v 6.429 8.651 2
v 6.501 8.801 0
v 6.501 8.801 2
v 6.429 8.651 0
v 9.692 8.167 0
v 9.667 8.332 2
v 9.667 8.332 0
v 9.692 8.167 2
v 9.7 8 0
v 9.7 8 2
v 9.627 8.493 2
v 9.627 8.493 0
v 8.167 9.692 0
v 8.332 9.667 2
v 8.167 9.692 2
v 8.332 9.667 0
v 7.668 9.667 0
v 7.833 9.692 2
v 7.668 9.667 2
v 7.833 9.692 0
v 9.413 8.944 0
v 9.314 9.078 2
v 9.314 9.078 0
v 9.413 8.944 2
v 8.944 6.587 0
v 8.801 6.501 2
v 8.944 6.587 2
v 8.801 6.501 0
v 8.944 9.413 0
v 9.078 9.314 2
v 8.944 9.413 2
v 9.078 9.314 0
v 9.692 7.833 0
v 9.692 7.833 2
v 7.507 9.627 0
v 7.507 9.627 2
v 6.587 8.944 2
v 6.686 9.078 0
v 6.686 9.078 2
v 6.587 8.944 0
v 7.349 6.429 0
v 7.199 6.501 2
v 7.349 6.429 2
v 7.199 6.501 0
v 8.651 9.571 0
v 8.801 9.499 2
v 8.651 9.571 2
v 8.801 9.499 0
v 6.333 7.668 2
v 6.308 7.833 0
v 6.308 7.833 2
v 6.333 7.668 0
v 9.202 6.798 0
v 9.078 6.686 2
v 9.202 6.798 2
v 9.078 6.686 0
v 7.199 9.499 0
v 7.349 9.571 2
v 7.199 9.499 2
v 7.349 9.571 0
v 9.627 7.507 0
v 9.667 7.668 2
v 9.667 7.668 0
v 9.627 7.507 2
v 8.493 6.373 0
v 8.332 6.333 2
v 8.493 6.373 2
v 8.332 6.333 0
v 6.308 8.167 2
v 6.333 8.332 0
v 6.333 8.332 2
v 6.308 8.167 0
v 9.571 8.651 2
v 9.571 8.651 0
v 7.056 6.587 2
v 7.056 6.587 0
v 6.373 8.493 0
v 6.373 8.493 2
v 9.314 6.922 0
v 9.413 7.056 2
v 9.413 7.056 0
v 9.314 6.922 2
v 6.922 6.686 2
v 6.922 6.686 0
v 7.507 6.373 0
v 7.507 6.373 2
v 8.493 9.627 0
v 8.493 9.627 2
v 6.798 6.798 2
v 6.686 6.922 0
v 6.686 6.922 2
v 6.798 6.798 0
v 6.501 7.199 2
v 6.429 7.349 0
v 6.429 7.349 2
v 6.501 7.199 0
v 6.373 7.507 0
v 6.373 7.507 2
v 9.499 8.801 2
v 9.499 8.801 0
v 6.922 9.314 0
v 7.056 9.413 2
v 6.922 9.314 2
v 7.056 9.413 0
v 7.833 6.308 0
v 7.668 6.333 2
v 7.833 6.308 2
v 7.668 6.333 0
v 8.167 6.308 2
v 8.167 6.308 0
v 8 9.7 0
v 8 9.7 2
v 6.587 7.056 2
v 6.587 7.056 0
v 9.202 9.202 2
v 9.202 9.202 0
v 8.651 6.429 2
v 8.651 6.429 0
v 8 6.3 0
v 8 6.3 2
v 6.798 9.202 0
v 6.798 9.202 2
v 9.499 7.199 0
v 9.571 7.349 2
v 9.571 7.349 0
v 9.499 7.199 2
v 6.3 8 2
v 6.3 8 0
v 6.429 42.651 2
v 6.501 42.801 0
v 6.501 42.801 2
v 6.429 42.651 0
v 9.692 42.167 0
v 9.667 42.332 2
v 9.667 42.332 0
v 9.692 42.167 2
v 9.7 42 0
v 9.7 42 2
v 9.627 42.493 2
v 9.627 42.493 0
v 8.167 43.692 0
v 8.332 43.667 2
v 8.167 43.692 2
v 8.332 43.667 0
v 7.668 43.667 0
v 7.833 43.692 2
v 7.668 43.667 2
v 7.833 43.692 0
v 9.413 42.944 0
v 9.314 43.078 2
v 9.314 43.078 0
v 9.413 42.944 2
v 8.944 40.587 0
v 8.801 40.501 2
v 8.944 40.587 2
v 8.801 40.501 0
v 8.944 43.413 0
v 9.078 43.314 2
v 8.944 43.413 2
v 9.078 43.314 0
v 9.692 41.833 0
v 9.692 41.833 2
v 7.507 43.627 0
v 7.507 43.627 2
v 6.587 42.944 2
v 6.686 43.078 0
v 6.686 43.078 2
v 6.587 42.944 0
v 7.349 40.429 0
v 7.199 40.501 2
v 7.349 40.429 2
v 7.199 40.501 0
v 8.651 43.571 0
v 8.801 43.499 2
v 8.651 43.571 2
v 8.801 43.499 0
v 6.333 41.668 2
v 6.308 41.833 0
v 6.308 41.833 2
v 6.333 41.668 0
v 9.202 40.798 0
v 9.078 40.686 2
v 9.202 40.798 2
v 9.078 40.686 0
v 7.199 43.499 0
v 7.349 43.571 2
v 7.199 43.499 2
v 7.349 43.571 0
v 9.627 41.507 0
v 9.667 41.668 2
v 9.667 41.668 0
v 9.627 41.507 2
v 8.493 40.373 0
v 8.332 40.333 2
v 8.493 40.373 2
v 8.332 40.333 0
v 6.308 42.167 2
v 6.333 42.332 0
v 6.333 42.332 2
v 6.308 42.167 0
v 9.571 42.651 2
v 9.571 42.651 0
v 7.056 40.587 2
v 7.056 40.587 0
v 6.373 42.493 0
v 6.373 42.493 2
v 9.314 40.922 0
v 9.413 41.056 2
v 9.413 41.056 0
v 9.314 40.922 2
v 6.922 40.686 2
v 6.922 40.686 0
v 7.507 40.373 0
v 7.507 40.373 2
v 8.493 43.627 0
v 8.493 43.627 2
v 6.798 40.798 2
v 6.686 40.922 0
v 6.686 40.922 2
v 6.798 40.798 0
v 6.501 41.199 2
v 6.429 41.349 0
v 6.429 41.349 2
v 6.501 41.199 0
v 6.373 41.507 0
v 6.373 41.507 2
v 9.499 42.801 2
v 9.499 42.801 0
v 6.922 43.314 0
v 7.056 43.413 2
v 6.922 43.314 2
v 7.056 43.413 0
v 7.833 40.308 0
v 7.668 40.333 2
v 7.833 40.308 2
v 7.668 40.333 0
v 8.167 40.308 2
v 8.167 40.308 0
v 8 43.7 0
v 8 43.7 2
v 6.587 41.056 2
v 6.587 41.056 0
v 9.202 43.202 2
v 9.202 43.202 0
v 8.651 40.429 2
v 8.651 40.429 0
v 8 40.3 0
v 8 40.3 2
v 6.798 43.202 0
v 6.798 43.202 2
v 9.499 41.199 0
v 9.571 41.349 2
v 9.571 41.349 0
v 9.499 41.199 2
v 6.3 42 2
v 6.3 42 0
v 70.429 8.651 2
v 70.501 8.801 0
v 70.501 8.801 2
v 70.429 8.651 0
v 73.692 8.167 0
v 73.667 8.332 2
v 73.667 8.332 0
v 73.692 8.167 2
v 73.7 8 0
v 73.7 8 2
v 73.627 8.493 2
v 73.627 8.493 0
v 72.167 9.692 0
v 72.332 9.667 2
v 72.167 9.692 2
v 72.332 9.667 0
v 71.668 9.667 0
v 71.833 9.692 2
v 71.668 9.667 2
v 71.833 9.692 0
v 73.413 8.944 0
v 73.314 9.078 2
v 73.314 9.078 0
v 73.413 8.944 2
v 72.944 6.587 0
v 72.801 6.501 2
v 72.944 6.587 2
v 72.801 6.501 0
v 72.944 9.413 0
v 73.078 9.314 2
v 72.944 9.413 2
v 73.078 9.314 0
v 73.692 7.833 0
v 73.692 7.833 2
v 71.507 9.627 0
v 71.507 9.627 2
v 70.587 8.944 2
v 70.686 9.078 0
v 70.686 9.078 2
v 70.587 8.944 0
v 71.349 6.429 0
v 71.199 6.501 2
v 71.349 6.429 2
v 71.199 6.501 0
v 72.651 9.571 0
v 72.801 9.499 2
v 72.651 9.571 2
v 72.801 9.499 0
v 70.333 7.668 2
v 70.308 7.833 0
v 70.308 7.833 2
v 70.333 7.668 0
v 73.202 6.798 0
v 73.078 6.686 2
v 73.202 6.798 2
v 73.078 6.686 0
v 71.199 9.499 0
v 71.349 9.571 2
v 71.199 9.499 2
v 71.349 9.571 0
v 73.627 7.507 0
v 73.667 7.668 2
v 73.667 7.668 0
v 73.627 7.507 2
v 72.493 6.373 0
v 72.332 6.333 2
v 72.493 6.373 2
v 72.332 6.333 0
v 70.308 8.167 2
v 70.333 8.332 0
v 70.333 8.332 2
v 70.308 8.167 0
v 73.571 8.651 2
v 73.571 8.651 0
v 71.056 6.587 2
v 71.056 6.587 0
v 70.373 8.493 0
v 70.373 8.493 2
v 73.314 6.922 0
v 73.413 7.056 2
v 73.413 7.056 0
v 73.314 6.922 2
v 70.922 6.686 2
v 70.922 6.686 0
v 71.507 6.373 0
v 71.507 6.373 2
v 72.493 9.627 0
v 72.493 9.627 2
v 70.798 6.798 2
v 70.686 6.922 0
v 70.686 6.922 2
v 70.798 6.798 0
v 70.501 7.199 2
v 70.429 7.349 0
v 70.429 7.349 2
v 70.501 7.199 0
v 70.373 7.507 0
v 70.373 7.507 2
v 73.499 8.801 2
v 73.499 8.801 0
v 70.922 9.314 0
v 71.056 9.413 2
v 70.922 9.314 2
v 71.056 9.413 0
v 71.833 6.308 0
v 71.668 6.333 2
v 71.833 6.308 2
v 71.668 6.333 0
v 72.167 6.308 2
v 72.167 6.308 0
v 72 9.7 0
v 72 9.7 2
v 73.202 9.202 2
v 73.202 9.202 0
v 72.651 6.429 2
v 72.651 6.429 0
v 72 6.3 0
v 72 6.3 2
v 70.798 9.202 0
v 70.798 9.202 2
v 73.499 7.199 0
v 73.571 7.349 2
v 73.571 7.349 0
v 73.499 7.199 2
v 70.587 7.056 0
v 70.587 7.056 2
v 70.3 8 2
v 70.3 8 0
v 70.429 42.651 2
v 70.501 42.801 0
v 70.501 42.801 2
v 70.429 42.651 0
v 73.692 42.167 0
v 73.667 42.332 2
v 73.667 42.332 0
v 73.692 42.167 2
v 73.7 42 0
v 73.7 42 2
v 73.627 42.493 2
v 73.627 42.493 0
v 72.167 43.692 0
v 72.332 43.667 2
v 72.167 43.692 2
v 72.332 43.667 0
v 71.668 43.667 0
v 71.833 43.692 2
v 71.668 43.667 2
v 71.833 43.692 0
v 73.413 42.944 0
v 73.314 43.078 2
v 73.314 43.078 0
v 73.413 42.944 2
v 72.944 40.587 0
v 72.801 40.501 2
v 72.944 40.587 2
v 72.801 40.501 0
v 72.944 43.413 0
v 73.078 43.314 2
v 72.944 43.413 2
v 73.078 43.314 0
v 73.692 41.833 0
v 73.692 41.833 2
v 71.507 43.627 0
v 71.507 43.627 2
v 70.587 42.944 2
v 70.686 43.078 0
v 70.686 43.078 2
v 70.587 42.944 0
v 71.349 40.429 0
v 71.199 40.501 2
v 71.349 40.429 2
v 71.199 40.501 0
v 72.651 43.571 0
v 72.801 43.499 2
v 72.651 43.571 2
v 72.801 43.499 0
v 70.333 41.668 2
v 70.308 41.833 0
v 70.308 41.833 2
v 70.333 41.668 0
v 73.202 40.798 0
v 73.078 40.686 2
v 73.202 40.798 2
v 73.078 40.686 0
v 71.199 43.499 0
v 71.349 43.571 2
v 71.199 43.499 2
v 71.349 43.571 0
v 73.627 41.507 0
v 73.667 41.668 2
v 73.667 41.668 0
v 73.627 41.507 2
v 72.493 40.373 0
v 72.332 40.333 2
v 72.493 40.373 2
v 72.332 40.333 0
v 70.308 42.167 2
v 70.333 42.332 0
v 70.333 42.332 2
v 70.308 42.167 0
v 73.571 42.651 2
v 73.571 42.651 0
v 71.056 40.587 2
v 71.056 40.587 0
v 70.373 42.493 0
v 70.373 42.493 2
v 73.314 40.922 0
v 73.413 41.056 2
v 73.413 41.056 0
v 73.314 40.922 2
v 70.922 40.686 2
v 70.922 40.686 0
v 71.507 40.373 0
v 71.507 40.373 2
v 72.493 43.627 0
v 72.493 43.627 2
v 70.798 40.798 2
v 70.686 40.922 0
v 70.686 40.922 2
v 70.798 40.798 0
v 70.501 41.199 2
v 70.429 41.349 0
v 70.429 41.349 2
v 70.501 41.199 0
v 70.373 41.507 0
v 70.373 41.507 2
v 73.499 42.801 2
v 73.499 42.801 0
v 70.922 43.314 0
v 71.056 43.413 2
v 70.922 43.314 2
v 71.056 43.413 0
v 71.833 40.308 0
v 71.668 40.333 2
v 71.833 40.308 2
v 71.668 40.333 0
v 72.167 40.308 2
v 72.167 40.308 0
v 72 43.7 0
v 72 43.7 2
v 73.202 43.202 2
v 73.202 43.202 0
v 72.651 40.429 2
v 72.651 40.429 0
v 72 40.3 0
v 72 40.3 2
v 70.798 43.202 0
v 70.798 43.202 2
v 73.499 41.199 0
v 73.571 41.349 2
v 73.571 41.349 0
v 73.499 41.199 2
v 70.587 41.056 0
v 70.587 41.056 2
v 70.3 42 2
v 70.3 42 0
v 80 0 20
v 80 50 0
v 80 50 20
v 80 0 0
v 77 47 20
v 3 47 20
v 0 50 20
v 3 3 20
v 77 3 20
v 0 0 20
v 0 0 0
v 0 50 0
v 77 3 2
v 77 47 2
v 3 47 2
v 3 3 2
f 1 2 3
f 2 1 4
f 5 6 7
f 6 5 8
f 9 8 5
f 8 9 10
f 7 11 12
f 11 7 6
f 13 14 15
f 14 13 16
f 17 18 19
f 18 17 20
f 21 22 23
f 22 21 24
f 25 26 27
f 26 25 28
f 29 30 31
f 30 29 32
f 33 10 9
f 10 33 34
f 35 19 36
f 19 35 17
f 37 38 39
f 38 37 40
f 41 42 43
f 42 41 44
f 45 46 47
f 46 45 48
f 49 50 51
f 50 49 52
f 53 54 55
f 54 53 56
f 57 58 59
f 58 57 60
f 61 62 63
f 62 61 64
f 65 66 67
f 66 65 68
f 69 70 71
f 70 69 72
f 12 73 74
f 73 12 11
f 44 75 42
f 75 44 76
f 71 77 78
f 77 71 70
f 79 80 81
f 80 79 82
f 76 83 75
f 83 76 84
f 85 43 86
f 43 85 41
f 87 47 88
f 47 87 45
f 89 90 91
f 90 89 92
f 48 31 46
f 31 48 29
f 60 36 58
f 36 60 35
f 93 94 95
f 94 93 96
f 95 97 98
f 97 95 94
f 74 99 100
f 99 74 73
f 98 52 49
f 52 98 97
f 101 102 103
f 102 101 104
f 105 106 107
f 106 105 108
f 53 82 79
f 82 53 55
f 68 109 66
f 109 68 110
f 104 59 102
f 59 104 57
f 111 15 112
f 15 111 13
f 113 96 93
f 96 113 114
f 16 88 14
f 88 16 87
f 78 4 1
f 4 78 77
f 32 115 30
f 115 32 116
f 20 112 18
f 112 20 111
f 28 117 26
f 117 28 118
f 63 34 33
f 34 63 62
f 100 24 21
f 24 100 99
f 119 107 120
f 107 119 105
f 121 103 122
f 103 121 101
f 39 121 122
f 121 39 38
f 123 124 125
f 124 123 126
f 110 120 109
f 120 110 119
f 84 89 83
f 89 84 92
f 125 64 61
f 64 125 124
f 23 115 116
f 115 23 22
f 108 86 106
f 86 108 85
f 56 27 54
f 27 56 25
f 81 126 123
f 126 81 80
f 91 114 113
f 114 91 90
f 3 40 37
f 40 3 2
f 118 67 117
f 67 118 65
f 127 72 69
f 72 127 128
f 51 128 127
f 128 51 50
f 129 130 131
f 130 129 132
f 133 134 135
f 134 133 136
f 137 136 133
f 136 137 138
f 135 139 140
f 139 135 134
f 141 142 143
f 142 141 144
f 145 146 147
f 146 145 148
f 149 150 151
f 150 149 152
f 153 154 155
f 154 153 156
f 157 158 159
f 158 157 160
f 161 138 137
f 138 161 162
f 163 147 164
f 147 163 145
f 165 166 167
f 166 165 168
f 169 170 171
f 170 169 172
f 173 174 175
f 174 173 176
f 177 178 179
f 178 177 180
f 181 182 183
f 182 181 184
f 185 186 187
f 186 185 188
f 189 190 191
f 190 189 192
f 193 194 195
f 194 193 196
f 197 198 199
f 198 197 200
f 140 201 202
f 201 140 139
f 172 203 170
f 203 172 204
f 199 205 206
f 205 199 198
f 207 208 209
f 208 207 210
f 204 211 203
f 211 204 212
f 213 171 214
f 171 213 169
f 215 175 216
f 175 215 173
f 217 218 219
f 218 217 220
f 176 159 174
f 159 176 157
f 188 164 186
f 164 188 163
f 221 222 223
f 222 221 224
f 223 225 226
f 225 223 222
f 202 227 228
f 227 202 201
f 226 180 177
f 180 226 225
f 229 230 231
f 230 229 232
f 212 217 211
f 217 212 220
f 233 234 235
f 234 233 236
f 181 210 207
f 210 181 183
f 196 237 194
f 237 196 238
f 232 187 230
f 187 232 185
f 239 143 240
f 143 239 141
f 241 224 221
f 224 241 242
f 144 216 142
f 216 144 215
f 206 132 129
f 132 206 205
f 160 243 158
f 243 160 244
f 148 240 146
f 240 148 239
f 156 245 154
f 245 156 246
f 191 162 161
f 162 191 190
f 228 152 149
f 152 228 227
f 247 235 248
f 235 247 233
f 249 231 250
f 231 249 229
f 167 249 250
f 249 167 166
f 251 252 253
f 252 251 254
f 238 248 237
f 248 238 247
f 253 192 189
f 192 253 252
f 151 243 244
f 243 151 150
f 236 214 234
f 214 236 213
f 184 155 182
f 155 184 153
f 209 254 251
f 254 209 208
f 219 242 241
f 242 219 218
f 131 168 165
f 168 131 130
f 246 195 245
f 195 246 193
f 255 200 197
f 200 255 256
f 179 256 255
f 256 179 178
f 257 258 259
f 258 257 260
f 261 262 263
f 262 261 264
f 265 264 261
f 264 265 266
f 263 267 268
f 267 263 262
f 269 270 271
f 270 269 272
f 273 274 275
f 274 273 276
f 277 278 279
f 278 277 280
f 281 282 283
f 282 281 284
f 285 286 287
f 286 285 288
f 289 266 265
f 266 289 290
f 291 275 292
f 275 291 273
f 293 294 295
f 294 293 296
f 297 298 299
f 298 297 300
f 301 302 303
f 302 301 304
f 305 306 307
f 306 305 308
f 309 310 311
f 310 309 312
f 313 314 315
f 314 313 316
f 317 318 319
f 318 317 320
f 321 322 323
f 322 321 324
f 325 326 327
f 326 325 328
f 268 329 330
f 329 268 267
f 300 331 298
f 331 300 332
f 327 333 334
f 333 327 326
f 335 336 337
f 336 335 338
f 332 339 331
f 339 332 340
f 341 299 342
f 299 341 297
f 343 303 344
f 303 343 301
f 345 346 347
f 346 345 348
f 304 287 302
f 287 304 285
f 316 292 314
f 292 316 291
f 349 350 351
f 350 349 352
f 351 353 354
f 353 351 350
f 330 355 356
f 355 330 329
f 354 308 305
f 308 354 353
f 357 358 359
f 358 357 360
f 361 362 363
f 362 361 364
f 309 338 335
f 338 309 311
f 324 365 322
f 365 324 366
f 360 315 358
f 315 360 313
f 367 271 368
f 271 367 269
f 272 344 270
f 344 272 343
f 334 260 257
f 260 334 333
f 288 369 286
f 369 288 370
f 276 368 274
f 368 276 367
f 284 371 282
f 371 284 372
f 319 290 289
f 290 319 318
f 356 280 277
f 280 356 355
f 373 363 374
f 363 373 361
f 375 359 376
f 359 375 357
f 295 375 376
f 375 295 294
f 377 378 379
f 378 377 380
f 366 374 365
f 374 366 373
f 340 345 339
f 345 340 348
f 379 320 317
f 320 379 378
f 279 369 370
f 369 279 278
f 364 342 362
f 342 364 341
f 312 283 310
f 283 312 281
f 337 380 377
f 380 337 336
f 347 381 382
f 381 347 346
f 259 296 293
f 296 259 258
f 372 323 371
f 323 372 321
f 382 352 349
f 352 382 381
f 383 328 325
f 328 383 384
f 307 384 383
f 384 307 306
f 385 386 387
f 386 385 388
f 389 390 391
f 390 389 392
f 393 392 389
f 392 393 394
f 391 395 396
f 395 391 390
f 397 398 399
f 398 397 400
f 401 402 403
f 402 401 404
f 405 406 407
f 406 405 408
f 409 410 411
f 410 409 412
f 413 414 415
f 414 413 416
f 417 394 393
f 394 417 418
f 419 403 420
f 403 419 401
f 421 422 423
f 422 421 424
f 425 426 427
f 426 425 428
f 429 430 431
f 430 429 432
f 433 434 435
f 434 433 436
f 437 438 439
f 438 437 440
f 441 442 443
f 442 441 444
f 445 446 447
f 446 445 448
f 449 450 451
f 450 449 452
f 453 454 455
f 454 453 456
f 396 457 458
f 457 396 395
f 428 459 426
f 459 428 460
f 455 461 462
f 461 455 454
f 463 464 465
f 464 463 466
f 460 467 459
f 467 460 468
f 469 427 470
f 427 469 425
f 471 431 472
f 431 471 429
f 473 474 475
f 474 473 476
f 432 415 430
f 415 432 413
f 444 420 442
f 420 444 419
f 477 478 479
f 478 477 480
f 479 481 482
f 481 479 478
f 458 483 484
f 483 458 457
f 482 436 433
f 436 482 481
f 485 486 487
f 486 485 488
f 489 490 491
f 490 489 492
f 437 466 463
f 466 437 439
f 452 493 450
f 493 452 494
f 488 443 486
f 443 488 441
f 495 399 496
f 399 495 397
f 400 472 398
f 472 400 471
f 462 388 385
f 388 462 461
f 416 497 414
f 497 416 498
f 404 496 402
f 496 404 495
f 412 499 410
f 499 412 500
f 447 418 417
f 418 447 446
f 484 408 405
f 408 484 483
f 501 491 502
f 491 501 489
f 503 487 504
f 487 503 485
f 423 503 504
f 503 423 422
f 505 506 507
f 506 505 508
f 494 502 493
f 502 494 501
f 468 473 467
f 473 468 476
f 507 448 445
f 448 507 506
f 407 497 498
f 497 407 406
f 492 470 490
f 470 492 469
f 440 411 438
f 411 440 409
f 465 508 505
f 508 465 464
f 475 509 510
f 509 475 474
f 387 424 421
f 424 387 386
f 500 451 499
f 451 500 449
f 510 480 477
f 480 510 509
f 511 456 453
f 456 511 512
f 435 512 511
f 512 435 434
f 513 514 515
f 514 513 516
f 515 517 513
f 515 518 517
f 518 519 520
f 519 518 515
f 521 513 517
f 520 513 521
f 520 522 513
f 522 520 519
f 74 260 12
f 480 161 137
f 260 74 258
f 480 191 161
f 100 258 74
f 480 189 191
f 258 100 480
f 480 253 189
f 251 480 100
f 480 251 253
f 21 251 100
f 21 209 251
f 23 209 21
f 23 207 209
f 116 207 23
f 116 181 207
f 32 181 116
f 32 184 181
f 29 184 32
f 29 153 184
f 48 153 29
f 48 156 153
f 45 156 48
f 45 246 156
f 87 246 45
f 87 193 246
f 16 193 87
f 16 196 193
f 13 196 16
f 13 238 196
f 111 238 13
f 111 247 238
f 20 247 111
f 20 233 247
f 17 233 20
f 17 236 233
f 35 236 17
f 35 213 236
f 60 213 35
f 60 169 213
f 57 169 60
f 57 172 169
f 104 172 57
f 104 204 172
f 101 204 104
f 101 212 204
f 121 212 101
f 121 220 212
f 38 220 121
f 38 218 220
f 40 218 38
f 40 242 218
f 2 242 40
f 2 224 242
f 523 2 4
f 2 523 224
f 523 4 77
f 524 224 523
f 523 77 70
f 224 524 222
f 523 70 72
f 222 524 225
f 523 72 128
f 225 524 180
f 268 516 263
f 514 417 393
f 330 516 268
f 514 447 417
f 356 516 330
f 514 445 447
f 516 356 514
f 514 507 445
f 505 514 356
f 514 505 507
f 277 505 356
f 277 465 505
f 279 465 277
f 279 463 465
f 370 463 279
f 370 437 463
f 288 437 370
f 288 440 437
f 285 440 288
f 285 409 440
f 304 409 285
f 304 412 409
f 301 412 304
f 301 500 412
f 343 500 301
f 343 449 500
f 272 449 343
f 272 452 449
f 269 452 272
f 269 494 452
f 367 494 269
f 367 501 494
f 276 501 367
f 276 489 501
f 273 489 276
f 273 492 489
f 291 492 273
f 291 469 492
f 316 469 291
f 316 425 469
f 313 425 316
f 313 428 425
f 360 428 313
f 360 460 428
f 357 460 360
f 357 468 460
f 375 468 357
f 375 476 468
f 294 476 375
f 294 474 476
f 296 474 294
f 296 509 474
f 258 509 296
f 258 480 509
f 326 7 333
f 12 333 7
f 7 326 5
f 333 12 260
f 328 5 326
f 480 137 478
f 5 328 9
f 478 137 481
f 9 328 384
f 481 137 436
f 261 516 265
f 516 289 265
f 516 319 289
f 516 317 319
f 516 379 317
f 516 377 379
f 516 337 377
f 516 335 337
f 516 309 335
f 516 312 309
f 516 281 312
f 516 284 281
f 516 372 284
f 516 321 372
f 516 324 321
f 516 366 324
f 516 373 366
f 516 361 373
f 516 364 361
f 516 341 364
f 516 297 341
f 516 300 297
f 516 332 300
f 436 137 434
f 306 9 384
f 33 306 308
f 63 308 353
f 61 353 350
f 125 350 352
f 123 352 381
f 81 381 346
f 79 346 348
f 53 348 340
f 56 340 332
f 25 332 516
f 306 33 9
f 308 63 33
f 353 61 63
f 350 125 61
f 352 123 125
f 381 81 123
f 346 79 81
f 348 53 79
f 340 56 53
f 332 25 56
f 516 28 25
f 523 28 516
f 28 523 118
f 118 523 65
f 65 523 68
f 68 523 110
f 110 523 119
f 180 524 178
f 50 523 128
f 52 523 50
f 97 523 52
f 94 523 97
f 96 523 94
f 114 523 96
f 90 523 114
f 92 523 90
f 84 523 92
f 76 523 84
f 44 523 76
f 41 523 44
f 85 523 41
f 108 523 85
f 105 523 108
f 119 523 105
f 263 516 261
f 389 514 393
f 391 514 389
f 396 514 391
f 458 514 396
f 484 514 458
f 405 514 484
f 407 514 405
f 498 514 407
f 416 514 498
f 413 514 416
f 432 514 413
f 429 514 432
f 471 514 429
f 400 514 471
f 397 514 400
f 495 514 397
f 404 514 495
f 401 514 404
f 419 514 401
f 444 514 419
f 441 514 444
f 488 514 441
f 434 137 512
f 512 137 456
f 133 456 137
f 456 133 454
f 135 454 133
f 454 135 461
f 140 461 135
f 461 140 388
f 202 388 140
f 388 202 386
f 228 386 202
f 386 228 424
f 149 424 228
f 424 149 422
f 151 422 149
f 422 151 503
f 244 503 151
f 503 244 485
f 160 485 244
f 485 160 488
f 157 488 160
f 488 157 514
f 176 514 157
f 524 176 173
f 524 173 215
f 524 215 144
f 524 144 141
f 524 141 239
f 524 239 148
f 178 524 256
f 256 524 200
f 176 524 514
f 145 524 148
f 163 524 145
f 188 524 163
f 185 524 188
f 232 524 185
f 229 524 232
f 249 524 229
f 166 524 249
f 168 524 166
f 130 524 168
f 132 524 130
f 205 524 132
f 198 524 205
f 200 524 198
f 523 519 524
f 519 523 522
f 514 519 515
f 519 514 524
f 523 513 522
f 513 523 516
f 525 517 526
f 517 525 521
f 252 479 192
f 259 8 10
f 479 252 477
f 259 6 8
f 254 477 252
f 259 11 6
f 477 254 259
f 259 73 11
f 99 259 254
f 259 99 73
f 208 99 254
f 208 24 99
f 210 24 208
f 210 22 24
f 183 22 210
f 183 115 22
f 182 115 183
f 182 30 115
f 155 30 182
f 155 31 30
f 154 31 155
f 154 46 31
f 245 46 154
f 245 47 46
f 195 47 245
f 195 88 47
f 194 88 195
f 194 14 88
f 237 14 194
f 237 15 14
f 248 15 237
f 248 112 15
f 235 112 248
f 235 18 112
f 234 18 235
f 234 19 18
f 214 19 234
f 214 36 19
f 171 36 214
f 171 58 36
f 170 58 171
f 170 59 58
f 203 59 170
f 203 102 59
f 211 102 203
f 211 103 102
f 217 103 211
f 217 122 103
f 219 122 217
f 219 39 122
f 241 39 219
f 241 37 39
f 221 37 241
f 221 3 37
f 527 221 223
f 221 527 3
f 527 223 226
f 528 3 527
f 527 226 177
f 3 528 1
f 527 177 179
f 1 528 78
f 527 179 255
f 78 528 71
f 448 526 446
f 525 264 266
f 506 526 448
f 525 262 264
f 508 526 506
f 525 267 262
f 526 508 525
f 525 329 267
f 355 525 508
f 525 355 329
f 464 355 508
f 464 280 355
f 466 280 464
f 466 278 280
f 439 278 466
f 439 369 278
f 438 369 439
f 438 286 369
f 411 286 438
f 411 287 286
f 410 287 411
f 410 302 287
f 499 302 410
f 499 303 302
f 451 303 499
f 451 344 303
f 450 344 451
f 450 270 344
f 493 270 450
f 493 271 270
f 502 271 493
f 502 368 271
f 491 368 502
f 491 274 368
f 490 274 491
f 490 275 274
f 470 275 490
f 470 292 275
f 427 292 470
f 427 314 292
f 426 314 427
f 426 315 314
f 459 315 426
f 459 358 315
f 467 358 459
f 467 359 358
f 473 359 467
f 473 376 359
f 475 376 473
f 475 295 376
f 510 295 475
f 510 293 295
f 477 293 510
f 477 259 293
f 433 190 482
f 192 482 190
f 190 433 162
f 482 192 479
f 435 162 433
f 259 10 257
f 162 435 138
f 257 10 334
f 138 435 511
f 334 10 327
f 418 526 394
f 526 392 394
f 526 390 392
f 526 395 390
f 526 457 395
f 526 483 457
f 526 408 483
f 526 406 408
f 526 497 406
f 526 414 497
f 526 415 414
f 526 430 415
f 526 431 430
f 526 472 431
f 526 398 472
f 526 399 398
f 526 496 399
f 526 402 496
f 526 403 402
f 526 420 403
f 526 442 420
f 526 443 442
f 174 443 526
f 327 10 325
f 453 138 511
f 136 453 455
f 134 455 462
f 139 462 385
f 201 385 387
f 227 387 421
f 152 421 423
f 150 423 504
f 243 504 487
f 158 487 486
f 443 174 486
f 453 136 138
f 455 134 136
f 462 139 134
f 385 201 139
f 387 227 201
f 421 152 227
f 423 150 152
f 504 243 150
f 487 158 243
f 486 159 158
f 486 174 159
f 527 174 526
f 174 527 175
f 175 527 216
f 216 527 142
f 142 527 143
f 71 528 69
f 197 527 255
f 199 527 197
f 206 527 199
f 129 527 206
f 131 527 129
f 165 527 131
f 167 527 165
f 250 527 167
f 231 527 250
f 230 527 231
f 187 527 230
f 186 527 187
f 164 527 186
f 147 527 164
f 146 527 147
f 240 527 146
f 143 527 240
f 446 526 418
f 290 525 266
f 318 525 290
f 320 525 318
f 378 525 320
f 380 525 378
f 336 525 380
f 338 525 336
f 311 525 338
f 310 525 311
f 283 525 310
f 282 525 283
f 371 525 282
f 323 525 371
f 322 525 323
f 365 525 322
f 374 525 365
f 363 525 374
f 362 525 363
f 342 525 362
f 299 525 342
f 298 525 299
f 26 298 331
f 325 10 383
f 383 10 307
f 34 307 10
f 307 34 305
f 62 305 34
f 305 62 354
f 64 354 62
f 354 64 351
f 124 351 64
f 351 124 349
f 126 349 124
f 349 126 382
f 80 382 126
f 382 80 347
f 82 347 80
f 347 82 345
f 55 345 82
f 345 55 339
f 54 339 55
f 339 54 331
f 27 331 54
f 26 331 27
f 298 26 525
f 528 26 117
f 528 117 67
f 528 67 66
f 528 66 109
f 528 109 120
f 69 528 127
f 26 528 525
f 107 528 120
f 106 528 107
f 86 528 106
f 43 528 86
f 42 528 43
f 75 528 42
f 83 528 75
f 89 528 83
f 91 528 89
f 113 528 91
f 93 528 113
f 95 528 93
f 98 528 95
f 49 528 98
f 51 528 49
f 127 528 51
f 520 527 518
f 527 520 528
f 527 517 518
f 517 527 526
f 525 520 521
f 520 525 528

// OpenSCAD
// Smoke-test tray for the Grok Build ↔ Grok Bot OpenSCAD loop.
// Outer 80 x 50 x 20 mm, 3 mm walls, 2 mm floor, four M3 clearance holes.

outer_x = 80;
outer_y = 50;
outer_z = 20;
wall = 3;
floor_z = 2;
hole_d = 3.4;
hole_inset = 8;
$fn = 64;

module smoke_tray() {
    difference() {
        cube([outer_x, outer_y, outer_z]);

        translate([wall, wall, floor_z])
            cube([
                outer_x - 2 * wall,
                outer_y - 2 * wall,
                outer_z - floor_z + 0.01
            ]);

        for (x = [hole_inset, outer_x - hole_inset])
            for (y = [hole_inset, outer_y - hole_inset])
                translate([x, y, -0.01])
                    cylinder(h = floor_z + 0.02, d = hole_d);
    }
}

smoke_tray();
